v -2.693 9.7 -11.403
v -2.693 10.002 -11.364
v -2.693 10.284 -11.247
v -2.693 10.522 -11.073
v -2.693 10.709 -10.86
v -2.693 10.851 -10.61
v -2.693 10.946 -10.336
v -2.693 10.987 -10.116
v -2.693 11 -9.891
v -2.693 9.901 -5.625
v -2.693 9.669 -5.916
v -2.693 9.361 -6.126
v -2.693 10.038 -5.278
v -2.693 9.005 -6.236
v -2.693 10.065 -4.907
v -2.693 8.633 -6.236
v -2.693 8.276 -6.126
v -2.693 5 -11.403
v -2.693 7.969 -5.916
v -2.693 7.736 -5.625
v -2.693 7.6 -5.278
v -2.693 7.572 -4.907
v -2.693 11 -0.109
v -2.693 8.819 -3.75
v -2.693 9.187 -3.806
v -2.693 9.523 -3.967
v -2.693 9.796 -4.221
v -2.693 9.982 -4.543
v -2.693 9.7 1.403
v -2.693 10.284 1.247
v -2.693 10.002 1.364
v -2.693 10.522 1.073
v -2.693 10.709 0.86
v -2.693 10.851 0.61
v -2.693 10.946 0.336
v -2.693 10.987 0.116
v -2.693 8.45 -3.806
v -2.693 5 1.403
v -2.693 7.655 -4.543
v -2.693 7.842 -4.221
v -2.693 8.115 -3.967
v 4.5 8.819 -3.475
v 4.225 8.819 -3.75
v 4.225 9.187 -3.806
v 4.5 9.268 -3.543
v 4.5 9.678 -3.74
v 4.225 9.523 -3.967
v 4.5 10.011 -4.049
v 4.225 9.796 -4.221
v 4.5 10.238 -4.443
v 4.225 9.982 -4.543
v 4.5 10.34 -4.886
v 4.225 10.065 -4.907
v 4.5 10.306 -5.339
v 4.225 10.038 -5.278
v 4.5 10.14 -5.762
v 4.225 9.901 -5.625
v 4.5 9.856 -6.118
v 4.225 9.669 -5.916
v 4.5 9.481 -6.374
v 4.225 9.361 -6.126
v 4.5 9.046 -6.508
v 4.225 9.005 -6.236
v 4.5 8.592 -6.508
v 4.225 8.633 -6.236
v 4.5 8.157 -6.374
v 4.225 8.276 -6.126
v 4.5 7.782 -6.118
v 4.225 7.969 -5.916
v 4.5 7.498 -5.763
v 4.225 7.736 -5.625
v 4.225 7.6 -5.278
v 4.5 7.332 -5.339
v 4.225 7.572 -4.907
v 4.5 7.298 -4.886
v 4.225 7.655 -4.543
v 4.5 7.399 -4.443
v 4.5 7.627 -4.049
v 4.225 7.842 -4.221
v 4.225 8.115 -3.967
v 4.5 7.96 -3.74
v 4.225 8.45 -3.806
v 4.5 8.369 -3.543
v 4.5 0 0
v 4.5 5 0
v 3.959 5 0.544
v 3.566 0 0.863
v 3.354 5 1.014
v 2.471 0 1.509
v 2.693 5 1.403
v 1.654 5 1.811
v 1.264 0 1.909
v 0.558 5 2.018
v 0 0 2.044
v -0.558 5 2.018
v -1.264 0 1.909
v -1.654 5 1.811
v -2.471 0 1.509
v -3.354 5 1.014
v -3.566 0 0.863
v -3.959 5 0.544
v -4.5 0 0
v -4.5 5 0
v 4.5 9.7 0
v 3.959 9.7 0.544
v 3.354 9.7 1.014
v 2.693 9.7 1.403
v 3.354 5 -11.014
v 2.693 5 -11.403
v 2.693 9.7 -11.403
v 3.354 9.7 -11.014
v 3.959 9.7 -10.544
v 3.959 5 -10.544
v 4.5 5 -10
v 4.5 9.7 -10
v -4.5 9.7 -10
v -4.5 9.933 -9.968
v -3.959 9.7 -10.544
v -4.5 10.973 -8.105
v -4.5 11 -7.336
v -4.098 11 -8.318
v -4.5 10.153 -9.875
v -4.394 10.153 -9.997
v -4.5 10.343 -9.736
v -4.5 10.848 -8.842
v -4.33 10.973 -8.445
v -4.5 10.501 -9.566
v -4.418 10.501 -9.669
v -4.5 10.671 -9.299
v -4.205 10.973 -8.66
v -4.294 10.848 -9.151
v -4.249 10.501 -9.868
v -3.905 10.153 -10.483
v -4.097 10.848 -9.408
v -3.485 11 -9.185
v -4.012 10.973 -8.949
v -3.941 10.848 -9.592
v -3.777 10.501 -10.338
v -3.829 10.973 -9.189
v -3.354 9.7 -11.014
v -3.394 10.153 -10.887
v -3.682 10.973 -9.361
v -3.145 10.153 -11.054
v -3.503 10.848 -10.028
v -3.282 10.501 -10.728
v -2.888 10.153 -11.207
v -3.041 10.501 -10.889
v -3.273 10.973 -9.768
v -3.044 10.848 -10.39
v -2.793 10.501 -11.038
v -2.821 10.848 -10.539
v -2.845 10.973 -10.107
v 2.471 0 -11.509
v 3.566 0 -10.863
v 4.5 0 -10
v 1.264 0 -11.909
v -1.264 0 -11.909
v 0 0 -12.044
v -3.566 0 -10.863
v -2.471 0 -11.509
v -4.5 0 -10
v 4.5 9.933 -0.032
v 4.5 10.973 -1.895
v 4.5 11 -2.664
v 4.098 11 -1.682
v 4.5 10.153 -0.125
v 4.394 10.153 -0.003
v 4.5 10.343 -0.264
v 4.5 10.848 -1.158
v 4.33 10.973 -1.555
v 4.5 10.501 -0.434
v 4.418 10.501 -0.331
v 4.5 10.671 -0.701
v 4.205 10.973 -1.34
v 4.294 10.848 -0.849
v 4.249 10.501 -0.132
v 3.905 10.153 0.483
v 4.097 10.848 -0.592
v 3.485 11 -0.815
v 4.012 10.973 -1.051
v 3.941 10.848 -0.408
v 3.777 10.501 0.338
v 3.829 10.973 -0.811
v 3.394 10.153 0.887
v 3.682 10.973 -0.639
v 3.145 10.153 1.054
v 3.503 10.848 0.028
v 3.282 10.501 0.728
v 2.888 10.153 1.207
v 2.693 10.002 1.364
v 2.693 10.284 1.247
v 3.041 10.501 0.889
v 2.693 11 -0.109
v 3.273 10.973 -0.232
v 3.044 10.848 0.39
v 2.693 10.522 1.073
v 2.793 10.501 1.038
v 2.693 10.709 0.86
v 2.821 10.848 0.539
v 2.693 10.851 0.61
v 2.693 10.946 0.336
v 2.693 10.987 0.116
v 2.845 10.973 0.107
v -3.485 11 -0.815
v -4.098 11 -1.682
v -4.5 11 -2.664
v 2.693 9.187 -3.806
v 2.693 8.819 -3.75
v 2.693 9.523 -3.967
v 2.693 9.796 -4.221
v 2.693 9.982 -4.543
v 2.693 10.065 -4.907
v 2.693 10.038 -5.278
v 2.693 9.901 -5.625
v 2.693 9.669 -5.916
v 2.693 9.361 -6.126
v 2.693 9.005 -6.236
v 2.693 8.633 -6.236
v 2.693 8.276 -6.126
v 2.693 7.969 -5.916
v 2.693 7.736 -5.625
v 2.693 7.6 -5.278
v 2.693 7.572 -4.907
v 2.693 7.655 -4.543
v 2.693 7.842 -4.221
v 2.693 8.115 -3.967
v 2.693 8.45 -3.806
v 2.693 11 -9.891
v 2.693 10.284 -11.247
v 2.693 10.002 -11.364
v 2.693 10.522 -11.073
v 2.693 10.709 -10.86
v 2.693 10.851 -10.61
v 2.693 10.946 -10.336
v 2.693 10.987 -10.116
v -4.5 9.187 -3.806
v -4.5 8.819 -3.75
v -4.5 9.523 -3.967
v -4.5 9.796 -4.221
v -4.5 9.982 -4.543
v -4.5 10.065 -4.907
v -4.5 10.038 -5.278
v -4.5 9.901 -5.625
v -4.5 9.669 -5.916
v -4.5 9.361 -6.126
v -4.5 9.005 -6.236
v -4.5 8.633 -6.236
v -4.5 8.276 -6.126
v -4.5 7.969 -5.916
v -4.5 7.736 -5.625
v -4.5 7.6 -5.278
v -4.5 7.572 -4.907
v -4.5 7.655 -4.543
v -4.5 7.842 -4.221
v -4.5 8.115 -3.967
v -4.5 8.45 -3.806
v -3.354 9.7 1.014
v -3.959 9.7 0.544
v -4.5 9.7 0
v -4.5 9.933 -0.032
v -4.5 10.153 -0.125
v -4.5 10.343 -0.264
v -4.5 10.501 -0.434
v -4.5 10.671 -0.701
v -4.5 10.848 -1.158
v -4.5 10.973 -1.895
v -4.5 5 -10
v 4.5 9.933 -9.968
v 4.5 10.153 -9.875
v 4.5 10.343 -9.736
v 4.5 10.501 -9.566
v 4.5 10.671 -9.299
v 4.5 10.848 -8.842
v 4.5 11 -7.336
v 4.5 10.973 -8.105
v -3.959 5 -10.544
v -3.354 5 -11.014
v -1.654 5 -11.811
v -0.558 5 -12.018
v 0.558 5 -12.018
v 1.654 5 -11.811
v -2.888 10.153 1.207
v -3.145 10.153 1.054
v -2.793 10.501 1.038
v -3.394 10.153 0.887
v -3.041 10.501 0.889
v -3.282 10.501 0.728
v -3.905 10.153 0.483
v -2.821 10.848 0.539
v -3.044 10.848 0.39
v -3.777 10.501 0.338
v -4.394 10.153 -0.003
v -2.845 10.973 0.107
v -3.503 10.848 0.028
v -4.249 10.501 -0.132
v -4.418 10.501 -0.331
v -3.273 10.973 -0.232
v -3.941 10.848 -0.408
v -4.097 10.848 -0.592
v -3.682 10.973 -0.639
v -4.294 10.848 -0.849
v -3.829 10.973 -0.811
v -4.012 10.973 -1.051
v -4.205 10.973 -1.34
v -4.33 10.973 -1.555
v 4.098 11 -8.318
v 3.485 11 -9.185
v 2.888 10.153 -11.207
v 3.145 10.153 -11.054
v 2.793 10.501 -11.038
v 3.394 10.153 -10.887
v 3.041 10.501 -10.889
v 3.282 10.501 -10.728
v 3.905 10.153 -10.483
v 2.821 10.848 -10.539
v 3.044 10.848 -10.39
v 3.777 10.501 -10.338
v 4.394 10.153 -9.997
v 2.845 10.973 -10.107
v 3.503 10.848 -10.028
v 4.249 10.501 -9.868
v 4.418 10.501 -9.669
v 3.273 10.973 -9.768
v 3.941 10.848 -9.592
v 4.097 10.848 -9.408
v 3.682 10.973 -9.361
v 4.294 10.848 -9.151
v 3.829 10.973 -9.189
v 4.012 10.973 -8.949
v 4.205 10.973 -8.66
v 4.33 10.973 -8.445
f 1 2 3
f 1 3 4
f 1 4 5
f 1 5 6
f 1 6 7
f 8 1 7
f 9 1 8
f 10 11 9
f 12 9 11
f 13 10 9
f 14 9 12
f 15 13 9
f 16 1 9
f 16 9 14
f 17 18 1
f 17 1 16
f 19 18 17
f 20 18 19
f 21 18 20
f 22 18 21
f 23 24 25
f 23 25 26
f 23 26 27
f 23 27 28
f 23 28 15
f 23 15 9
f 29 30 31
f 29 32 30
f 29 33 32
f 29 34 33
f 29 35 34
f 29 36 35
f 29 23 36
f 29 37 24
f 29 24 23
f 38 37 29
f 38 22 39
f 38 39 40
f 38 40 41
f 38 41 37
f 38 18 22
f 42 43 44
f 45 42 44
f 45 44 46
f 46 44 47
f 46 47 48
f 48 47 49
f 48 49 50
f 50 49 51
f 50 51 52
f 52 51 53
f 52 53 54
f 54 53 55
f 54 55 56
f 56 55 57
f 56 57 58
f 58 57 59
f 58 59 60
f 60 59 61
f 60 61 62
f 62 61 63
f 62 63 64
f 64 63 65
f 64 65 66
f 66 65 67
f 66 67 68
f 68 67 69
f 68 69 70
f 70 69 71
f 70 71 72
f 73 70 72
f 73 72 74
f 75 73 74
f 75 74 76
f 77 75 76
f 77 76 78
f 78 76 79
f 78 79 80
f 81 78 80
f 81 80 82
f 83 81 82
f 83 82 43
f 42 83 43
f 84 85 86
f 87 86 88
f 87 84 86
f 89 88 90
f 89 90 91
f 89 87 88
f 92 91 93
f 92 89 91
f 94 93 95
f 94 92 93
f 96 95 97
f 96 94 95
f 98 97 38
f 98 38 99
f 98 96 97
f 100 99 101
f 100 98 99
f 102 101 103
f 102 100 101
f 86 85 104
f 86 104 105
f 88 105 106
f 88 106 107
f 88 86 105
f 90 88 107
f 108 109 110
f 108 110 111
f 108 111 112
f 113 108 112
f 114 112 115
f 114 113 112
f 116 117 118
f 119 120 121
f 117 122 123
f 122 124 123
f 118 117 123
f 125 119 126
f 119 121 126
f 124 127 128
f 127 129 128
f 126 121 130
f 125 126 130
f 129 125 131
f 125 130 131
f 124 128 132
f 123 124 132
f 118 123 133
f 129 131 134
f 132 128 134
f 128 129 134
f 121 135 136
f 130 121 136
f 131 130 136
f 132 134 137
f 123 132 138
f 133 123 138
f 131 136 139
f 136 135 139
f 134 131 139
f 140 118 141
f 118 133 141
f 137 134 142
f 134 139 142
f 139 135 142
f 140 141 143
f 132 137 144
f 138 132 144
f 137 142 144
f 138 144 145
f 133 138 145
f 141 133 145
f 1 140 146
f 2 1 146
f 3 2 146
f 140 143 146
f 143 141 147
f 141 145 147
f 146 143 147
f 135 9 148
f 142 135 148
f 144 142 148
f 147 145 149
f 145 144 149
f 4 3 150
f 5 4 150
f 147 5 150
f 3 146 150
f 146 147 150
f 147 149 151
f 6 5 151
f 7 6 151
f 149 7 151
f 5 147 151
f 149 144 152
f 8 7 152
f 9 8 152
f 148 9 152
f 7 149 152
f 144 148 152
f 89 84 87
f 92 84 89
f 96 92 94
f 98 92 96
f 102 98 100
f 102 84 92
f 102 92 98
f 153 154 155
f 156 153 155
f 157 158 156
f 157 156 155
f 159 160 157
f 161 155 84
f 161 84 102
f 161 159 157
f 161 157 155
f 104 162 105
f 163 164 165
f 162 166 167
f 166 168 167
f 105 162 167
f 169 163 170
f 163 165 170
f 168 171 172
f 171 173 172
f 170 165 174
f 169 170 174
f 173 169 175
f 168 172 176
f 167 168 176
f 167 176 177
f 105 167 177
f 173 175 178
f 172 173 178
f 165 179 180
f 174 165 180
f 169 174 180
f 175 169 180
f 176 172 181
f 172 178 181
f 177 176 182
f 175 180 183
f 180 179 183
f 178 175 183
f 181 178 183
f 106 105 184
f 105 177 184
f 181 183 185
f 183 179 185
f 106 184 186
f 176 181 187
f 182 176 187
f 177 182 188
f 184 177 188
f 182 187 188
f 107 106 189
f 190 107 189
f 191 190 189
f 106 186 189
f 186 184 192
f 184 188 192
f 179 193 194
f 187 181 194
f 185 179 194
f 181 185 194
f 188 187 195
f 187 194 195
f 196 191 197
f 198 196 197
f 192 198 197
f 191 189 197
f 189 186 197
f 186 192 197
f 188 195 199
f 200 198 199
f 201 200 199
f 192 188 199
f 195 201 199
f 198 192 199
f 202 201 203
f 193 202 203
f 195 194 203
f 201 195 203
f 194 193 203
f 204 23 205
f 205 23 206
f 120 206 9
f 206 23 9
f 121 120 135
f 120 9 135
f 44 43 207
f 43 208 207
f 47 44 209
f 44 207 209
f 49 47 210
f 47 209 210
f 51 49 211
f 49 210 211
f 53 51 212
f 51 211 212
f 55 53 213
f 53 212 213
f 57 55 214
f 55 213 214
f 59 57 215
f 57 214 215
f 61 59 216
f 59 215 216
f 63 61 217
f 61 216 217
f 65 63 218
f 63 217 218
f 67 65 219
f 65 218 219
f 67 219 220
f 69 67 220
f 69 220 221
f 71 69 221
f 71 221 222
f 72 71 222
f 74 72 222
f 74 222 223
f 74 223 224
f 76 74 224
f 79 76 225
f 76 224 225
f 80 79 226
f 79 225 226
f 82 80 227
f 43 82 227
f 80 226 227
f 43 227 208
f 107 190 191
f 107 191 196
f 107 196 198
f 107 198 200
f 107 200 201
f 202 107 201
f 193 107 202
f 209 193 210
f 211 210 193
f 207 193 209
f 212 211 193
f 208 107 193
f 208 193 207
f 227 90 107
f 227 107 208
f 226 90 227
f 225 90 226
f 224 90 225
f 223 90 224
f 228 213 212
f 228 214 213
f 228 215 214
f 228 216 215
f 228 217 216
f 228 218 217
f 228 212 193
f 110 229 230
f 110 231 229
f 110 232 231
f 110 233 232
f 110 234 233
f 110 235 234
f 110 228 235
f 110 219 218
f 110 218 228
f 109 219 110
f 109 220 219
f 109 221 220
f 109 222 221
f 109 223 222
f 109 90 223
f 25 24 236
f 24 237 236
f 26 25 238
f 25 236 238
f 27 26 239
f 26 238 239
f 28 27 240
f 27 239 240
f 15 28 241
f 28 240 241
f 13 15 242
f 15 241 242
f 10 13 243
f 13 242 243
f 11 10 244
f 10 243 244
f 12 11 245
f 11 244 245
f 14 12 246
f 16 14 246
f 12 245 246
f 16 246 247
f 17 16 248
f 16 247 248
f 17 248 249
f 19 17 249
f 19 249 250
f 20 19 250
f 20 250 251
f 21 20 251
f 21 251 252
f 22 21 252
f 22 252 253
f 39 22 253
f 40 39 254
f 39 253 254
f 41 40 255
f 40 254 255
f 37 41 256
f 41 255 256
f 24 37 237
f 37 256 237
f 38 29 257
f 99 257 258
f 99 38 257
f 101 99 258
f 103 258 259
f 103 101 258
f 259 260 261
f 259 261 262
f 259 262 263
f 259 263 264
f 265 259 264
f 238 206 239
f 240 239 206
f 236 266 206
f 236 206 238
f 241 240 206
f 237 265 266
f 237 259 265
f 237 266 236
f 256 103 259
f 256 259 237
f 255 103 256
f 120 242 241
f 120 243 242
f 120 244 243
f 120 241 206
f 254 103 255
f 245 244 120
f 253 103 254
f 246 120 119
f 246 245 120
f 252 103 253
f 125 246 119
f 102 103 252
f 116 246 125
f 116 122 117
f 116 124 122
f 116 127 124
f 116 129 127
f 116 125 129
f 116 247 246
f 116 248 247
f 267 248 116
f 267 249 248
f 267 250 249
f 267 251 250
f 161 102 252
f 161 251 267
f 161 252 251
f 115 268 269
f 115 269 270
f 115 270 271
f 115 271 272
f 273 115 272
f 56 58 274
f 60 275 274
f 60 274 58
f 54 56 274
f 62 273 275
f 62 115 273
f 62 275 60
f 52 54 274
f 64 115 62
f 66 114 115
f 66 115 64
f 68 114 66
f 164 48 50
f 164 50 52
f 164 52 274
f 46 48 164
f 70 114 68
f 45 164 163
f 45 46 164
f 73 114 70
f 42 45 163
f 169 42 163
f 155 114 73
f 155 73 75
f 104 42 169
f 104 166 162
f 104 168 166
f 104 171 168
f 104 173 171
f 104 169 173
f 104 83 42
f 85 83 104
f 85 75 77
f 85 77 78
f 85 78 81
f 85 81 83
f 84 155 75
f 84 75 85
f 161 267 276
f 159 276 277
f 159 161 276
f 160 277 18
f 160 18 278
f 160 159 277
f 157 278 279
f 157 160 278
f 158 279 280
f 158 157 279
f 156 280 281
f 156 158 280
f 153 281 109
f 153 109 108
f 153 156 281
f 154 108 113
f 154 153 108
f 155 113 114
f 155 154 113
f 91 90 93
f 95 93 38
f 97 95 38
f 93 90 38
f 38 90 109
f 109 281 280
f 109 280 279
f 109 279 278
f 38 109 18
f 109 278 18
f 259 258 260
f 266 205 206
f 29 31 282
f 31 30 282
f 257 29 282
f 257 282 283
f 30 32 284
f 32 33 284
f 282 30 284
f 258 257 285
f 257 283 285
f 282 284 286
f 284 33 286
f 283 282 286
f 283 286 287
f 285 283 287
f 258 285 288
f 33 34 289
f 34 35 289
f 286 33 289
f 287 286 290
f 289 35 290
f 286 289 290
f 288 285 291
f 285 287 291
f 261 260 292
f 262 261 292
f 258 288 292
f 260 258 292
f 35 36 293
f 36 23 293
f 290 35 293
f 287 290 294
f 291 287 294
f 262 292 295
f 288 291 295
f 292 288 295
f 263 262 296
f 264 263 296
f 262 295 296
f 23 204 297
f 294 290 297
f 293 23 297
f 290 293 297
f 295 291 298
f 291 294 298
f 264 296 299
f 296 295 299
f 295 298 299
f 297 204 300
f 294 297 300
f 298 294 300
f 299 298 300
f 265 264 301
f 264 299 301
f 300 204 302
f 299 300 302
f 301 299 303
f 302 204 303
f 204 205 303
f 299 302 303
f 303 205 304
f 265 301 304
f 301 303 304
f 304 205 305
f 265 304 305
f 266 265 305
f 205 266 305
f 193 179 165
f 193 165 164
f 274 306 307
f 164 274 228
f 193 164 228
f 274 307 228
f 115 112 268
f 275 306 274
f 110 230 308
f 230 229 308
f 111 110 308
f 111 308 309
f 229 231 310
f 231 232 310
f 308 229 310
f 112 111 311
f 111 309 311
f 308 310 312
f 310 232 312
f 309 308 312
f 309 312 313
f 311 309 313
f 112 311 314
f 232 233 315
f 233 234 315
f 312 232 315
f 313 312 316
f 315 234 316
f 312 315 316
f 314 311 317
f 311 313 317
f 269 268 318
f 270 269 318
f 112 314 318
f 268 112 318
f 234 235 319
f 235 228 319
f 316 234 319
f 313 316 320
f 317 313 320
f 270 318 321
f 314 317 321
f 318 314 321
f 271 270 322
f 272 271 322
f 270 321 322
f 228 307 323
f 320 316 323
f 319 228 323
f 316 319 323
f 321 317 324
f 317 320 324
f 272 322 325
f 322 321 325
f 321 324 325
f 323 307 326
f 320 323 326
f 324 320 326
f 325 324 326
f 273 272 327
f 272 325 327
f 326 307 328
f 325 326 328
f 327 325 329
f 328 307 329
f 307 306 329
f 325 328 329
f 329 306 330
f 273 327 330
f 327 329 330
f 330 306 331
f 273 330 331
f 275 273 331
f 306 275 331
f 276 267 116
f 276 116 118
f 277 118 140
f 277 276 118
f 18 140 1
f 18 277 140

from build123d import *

# Parameters (mm, degrees)
BOSS_EXTRUDE1_DEPTH         = 5
BOSS_EXTRUDE2_DEPTH         = 6
FILLET1_R                   = 1.3
M3_TAPPED_HOLE1_D           = 2.5
M3_TAPPED_HOLE1_CSINK_D     = 3.05
M3_TAPPED_HOLE1_CSINK_ANGLE = 90


with BuildPart() as part:
    # Sketch1 → Boss-Extrude1 (new body)
    with BuildSketch(Plane(origin=(0, 0, 0), x_dir=(1, 0, 0), z_dir=(0, 1, 0))):
        with BuildLine():
            Line((-4.5, 0), (-4.5, 10))
            ThreePointArc((-4.5, 10), (0, 12.044483976), (4.5, 10))
            Line((4.5, 10), (4.5, 0))
            ThreePointArc((4.5, 0), (0, -2.044483976), (-4.5, 0))
        make_face()
    extrude(amount=BOSS_EXTRUDE1_DEPTH)

    # Sketch2 → Boss-Extrude2 (add)
    with BuildSketch(Plane(origin=(0, 5, 0), x_dir=(1, 0, 0), z_dir=(0, 1, 0))):
        with BuildLine():
            Line((-2.692561773, 11.403358064), (-2.692561773, -1.403358064))
            ThreePointArc((-2.692561773, -1.403358064), (-3.66409466, -0.78901897), (-4.5, 0))
            Line((-4.5, 0), (-4.5, 10))
            ThreePointArc((-4.5, 10), (-3.66409466, 10.78901897), (-2.692561773, 11.403358064))
        make_face()
        with BuildLine():
            Line((4.5, 10), (4.5, 0))
            ThreePointArc((4.5, 0), (3.66409466, -0.78901897), (2.692561773, -1.403358064))
            Line((2.692561773, -1.403358064), (2.692561773, 11.403358064))
            ThreePointArc((2.692561773, 11.403358064), (3.66409466, 10.78901897), (4.5, 10))
        make_face()
    extrude(amount=BOSS_EXTRUDE2_DEPTH)

    # Fillet1
    fillet1_edges = [part.edges().sort_by_distance(p)[0] for p in [
        (-3.66409466, 11, -10.78901897),
        (-3.66409466, 11, 0.78901897),
        (3.66409466, 11, -10.78901897),
        (3.66409466, 11, 0.78901897),
    ]]
    fillet(fillet1_edges, radius=FILLET1_R)

    # M3 Tapped Hole1 (through all)
    with Locations(Plane(origin=(4.5, 0, 0), x_dir=(0, 0, -1), z_dir=(1, 0, 0))):
        with Locations((5, 8.818847832)):
            CounterSinkHole(M3_TAPPED_HOLE1_D / 2, M3_TAPPED_HOLE1_CSINK_D / 2, counter_sink_angle=M3_TAPPED_HOLE1_CSINK_ANGLE)


solid = part.part
